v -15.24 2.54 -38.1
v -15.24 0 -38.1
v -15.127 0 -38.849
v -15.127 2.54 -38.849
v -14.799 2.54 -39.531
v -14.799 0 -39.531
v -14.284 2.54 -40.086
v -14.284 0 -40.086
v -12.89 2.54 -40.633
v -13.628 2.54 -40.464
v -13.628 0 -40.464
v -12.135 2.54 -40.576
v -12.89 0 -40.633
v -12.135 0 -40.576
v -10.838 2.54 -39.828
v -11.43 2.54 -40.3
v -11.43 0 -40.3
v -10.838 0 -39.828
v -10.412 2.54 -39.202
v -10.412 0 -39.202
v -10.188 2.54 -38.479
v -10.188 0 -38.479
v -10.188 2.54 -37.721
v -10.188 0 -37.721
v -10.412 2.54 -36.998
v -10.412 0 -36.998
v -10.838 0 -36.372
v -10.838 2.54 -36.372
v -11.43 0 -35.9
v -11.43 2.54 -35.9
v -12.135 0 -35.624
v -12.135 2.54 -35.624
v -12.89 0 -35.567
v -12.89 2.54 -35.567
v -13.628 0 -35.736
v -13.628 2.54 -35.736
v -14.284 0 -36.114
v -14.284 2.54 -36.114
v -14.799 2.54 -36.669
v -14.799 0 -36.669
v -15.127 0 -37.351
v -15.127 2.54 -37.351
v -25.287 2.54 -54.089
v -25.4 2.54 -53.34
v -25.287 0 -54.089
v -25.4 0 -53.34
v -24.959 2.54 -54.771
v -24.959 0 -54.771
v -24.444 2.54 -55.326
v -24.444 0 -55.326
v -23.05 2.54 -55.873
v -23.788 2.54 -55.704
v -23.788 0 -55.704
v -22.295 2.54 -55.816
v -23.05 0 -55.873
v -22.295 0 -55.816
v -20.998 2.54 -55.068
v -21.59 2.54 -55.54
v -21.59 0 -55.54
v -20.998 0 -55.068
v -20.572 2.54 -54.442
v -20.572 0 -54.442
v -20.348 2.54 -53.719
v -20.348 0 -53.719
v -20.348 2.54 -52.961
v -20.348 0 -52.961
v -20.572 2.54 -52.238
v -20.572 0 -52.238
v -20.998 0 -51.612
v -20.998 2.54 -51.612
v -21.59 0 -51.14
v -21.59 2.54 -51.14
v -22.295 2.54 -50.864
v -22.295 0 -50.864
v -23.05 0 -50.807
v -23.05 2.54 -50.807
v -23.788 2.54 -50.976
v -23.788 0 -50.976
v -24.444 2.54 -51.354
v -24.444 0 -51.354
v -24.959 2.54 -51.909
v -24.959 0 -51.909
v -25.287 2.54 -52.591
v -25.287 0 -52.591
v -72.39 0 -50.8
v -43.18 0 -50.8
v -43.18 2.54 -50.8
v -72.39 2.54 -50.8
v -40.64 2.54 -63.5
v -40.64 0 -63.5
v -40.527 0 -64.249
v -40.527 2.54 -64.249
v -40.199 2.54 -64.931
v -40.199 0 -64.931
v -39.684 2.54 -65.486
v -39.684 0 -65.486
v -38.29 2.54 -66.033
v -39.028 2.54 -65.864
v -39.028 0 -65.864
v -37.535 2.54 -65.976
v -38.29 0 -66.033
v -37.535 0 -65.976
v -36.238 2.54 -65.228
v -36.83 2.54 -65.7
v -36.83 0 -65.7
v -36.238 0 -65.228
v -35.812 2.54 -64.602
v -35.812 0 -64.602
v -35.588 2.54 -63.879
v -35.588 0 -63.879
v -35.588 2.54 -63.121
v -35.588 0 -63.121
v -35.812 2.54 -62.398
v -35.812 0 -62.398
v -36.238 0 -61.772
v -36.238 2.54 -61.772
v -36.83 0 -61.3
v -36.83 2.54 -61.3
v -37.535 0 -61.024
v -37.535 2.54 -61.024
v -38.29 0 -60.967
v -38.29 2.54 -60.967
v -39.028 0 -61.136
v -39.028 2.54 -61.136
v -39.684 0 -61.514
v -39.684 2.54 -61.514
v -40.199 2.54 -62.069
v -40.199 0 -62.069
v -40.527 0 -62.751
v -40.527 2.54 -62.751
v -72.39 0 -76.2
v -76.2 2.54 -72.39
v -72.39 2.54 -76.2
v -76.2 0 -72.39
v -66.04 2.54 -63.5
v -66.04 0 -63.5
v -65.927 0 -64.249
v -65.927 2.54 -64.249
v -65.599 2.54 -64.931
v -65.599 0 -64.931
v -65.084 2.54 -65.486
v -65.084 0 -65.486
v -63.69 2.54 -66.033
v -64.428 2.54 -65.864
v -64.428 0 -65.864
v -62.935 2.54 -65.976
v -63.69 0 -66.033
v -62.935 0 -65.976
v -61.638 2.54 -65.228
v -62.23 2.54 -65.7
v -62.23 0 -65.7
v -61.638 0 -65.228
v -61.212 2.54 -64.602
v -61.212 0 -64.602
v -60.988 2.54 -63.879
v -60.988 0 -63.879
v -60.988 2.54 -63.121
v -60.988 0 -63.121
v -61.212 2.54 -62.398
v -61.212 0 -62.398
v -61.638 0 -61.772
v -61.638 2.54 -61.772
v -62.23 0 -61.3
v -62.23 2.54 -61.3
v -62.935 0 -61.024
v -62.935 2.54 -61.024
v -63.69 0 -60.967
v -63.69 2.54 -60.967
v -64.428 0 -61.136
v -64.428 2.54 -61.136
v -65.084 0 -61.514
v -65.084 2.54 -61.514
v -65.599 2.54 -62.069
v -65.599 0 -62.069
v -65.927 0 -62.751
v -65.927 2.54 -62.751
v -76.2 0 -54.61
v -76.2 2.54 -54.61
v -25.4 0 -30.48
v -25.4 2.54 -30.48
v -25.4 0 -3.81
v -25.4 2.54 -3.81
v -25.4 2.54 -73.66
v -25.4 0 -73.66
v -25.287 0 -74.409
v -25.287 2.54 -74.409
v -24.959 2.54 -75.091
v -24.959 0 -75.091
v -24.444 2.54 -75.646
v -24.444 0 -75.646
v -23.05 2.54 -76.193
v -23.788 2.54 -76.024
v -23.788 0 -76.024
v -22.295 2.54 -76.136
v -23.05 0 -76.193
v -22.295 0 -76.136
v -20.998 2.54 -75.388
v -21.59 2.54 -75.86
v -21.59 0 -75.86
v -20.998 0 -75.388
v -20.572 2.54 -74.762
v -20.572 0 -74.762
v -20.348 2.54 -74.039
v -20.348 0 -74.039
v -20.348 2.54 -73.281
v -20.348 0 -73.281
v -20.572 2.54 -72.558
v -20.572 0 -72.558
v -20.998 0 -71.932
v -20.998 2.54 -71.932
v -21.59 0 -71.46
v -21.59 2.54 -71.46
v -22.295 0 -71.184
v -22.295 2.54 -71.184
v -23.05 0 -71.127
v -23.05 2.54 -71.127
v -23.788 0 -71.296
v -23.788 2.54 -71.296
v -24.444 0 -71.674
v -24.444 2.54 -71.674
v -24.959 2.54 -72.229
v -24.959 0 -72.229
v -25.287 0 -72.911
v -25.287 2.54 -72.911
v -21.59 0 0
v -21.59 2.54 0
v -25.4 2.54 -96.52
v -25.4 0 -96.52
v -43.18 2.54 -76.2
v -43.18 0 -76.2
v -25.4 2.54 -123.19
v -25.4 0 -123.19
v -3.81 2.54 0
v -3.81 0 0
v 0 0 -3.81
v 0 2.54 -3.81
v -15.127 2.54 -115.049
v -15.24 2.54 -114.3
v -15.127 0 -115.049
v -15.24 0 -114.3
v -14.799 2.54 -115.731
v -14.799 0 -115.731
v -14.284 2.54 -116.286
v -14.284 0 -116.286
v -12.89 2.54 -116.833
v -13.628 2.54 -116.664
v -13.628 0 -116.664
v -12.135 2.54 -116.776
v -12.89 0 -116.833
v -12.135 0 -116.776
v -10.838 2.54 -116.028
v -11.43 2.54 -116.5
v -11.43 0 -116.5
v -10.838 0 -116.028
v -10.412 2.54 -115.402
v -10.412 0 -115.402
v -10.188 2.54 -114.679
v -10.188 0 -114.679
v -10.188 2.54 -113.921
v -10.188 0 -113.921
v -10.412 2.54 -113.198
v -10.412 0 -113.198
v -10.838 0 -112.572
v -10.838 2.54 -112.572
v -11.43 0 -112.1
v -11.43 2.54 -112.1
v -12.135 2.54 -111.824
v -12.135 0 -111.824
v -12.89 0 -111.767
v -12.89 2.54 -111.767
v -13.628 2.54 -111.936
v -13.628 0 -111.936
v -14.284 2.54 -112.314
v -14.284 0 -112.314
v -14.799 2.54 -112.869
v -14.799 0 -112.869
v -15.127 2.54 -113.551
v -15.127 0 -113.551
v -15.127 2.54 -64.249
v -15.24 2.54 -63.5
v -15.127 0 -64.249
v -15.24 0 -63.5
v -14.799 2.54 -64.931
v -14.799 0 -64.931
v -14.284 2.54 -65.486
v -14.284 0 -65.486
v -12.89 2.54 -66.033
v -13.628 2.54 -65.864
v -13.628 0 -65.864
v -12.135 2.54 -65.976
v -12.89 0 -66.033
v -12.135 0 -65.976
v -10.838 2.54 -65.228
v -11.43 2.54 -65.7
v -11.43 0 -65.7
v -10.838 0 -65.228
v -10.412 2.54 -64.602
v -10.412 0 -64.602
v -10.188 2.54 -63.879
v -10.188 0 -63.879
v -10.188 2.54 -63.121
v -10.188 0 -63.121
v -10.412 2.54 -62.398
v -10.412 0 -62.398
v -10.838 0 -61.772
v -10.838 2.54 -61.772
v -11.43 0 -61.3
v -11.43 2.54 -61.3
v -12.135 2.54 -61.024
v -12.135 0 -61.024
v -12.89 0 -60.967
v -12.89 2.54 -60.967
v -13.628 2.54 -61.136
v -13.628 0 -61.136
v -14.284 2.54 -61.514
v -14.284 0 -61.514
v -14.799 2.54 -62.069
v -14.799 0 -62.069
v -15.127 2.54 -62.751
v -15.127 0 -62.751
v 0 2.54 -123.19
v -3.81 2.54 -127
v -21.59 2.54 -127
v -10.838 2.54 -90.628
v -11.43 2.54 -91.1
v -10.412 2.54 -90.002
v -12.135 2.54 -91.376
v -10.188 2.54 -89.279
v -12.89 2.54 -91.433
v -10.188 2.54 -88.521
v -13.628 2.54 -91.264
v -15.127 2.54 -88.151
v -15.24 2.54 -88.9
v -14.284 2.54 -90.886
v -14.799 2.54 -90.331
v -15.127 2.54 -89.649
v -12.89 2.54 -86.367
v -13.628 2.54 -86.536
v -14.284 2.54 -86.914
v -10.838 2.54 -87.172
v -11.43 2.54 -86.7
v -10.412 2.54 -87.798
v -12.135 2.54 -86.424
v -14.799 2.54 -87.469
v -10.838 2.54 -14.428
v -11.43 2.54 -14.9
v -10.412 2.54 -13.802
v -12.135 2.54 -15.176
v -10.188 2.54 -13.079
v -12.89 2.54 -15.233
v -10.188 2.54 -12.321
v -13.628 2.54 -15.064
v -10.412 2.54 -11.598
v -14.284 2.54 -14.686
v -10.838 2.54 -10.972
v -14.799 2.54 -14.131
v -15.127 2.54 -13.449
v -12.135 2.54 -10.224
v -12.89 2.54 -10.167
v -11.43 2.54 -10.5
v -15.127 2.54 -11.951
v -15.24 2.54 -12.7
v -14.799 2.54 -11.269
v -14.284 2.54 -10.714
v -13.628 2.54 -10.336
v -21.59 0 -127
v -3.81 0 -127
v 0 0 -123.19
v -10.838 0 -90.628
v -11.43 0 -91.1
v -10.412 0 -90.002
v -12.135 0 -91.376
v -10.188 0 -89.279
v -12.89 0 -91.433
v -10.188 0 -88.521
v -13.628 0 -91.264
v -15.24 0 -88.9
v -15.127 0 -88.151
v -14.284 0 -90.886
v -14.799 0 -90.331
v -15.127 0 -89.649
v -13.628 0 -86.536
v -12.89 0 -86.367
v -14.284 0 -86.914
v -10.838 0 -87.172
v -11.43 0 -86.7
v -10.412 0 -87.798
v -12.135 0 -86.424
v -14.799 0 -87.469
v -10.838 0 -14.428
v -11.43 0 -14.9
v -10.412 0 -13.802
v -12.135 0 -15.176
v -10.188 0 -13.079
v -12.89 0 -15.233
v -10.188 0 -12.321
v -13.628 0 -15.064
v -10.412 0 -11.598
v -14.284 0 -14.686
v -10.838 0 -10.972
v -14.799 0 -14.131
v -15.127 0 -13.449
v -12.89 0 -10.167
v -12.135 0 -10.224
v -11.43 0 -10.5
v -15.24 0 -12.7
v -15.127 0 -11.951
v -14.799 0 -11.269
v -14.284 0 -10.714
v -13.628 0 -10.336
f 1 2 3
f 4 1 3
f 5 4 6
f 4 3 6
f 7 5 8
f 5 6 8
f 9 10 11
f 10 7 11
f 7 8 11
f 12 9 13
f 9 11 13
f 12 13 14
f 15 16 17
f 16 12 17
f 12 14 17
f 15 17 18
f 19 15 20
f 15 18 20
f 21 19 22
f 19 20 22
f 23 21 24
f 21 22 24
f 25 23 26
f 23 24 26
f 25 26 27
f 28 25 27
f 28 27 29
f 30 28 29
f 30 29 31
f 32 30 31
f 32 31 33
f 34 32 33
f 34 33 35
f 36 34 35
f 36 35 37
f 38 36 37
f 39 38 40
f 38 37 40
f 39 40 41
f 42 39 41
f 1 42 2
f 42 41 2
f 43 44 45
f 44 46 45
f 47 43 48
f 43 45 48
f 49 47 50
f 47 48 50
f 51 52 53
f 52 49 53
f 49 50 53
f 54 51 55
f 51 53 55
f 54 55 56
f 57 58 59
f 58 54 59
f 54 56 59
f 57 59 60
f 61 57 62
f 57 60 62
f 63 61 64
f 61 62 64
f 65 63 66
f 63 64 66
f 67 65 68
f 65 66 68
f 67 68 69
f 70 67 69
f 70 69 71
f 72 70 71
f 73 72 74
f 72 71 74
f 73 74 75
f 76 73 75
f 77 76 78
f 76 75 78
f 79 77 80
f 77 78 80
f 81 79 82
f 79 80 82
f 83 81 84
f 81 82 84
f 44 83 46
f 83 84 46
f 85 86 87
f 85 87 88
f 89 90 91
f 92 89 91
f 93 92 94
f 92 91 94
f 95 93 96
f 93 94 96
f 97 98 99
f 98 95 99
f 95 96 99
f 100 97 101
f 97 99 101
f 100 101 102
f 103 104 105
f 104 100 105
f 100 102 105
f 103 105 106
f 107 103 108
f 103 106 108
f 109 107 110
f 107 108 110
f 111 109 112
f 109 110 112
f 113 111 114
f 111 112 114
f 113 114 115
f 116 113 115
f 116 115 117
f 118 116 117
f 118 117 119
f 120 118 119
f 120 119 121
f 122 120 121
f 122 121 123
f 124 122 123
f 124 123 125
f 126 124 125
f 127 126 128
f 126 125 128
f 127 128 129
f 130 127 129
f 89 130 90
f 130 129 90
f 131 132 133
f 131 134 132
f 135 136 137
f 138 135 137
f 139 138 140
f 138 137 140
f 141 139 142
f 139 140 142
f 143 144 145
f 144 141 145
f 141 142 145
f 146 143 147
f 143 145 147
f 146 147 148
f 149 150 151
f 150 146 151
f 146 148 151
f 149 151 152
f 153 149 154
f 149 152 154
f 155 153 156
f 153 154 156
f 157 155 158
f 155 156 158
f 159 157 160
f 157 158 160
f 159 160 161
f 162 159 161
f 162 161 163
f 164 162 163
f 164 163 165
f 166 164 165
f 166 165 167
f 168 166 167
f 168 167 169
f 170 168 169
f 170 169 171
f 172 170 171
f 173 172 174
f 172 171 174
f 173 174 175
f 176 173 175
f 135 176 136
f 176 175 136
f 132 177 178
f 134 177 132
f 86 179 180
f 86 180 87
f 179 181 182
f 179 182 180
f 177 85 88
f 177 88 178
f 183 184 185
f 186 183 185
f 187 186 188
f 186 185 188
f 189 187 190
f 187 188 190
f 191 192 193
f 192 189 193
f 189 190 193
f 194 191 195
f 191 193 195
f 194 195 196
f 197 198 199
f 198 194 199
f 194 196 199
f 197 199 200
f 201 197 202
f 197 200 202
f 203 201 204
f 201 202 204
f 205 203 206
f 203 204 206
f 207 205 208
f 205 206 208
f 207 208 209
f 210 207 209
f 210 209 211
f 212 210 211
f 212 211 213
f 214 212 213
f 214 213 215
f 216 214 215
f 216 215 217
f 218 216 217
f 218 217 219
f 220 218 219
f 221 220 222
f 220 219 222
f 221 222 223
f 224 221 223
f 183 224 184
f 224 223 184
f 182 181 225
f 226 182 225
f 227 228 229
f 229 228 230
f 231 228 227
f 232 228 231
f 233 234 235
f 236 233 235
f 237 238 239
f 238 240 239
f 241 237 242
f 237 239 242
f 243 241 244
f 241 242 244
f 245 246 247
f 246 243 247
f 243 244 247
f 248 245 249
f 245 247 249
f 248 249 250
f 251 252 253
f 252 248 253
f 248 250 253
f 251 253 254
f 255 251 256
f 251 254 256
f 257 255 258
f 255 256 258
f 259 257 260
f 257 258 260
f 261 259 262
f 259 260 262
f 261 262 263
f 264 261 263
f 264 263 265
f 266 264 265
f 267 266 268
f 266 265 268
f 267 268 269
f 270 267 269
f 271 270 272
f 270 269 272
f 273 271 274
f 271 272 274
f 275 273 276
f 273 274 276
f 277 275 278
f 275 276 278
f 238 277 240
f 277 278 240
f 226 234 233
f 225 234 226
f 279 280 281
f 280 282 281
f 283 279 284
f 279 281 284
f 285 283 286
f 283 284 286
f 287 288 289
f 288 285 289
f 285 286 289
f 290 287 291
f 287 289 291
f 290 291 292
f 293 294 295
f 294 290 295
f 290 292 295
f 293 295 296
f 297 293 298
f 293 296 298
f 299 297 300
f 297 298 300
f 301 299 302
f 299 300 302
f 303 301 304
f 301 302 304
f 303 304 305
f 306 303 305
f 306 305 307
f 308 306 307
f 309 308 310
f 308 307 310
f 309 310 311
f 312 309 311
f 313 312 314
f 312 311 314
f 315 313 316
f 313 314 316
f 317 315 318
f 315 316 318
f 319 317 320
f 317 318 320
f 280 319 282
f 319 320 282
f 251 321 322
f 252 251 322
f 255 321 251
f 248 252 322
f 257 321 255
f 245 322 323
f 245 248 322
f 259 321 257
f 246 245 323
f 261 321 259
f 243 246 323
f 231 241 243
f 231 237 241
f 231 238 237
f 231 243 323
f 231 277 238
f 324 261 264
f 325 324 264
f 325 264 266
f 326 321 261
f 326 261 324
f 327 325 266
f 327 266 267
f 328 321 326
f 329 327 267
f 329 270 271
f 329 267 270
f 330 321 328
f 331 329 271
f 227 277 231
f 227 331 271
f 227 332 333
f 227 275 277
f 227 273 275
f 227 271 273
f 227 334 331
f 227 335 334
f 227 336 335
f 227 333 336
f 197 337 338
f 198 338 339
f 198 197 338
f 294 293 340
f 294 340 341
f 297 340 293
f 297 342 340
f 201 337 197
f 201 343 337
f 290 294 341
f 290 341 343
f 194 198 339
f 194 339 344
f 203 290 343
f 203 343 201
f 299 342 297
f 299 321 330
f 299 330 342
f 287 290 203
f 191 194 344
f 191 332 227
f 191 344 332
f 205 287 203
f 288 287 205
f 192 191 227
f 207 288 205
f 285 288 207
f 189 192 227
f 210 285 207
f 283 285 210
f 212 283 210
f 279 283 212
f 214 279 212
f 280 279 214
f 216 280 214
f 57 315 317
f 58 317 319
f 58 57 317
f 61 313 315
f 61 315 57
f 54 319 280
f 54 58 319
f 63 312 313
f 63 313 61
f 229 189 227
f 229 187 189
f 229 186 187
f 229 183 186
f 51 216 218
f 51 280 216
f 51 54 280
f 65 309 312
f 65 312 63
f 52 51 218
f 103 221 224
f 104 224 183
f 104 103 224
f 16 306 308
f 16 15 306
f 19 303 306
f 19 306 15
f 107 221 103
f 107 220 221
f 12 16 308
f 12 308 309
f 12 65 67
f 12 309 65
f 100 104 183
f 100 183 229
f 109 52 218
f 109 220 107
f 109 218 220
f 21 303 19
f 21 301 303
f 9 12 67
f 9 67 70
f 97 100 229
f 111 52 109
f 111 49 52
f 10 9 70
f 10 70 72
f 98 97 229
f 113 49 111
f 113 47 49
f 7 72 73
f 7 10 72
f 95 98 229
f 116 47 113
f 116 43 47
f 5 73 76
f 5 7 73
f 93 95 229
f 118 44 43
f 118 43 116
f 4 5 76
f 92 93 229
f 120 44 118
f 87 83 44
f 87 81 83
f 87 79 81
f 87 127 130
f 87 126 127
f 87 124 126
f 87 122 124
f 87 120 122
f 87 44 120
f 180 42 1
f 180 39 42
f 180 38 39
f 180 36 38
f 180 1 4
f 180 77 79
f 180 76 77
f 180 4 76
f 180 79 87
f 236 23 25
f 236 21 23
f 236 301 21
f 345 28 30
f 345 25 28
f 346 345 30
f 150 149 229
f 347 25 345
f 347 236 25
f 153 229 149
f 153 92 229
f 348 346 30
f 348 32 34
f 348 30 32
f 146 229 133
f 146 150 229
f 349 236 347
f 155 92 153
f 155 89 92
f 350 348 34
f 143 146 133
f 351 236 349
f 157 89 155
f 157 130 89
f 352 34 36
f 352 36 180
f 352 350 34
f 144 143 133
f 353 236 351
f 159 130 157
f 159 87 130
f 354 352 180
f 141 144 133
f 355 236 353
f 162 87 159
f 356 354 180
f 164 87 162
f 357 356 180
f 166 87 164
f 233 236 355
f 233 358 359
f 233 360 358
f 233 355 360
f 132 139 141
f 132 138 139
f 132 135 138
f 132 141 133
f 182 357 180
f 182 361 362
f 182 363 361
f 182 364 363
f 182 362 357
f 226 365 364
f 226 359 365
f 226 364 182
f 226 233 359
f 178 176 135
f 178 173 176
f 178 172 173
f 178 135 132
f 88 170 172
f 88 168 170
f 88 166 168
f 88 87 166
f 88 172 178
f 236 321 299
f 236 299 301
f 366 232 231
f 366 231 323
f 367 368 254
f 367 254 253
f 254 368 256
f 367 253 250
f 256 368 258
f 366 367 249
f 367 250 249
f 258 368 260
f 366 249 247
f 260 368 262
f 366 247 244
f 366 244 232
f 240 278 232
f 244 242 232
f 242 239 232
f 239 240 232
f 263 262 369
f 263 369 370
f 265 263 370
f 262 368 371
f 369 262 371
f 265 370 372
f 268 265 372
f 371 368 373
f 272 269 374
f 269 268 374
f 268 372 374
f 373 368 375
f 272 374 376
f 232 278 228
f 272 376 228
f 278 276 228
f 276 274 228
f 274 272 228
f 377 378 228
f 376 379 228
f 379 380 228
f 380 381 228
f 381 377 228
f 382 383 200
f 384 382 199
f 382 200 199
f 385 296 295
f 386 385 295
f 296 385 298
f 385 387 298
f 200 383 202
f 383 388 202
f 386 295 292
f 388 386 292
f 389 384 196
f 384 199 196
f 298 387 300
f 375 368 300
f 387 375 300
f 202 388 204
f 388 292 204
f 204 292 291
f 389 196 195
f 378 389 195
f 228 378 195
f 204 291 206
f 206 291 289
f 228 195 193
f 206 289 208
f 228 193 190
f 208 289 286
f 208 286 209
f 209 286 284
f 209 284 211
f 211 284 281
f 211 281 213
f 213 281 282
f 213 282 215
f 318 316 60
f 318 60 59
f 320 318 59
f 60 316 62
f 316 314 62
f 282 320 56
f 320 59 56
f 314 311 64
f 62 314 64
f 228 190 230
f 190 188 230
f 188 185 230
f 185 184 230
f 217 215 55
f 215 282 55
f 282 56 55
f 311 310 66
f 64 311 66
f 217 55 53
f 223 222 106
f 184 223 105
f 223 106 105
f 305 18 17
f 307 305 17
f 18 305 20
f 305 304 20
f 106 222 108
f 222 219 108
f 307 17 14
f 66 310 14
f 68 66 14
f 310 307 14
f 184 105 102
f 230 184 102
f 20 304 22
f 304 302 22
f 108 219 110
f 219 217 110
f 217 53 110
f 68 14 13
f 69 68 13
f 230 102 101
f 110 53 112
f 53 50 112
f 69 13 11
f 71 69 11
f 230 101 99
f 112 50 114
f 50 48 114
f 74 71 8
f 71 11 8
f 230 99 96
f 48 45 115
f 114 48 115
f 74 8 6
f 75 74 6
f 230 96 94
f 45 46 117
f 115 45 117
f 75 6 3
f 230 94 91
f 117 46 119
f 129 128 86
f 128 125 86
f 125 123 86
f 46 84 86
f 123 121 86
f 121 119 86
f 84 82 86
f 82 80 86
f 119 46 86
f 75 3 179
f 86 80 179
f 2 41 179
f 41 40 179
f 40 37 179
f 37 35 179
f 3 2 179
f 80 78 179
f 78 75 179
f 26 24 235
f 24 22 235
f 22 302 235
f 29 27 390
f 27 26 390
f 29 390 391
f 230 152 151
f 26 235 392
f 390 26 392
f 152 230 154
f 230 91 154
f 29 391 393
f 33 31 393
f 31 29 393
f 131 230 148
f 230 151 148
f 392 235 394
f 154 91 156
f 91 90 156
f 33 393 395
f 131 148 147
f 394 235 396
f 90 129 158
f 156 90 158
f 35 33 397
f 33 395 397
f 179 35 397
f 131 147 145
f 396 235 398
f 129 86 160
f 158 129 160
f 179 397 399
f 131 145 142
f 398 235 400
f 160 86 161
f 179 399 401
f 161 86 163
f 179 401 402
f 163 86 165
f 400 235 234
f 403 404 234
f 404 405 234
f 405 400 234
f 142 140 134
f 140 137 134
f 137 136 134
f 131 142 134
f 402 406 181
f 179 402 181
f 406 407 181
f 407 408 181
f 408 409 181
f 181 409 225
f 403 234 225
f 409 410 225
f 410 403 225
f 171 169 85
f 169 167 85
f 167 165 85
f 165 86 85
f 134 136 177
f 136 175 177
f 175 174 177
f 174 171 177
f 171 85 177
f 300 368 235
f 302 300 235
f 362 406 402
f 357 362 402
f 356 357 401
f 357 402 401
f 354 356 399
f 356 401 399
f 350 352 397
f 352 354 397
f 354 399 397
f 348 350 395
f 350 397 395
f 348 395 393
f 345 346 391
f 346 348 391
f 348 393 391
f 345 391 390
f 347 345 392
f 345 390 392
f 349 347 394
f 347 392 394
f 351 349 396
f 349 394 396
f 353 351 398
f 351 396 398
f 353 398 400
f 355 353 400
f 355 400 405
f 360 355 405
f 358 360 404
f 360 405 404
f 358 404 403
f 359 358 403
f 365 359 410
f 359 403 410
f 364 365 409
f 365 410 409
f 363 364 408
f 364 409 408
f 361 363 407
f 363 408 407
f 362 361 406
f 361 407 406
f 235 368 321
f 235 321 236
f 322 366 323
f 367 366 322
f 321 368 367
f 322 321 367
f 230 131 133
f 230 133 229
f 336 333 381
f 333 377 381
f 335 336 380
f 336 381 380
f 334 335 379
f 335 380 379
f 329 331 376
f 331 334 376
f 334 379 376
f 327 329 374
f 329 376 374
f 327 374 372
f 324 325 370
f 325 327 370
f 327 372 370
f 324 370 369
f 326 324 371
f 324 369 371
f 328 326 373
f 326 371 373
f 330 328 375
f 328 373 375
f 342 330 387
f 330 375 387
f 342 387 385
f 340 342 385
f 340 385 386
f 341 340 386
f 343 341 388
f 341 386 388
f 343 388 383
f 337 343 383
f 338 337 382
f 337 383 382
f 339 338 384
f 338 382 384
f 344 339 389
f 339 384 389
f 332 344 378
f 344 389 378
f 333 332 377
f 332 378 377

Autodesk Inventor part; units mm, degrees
ref_plane "YZ Plane" through (0, 0, 0) normal (1, 0, 0) x (0, 1, 0)
ref_plane "XZ Plane" through (0, 0, 0) normal (0, 1, 0) x (-1, 0, 0)
ref_plane "XY Plane" through (0, 0, 0) normal (0, 0, 1) x (1, 0, 0)
sketch "Sketch1" plane through (0, 0, 0) normal (0, 1, 0) x (-1, 0, 0)
  line L0 (25.4, -30.48) -> (43.18, -50.8)
  line L1 (25.4, -96.52) -> (43.18, -76.2)
  line L2 (3.81, 0) -> (0, -3.81)
  line L3 (0, -123.19) -> (3.81, -127)
  line L4 (25.4, -123.19) -> (21.59, -127)
  line L5 (25.4, -3.81) -> (21.59, 0)
  line L6 (72.39, -50.8) -> (76.2, -54.61)
  line L7 (76.2, -72.39) -> (72.39, -76.2)
  line L8 (25.4, -3.81) -> (25.4, -30.48)
  line L9 (43.18, -50.8) -> (72.39, -50.8)
  line L10 (76.2, -54.61) -> (76.2, -72.39)
  line L11 (72.39, -76.2) -> (43.18, -76.2)
  line L12 (25.4, -96.52) -> (25.4, -123.19)
  line L13 (21.59, -127) -> (3.81, -127)
  line L14 (0, -123.19) -> (0, -3.81)
  line L15 (3.81, 0) -> (21.59, 0)
  circle A0 centre (12.7, -12.7) radius 2.54
  circle A1 centre (12.7, -38.1) radius 2.54
  circle A2 centre (12.7, -63.5) radius 2.54
  circle A3 centre (12.7, -88.9) radius 2.54
  circle A4 centre (12.7, -114.3) radius 2.54
  circle A5 centre (63.5, -63.5) radius 2.54
  circle A6 centre (38.1, -63.5) radius 2.54
  circle A7 centre (22.86, -53.34) radius 2.54
  circle A8 centre (22.86, -73.66) radius 2.54
  point P0 (0, 0)
extrude "Extrusion1" add sketch "Sketch1" along normal blind 2.54
properties part number "1in tbracket for alu extrusions" material "Steel, Alloy"
